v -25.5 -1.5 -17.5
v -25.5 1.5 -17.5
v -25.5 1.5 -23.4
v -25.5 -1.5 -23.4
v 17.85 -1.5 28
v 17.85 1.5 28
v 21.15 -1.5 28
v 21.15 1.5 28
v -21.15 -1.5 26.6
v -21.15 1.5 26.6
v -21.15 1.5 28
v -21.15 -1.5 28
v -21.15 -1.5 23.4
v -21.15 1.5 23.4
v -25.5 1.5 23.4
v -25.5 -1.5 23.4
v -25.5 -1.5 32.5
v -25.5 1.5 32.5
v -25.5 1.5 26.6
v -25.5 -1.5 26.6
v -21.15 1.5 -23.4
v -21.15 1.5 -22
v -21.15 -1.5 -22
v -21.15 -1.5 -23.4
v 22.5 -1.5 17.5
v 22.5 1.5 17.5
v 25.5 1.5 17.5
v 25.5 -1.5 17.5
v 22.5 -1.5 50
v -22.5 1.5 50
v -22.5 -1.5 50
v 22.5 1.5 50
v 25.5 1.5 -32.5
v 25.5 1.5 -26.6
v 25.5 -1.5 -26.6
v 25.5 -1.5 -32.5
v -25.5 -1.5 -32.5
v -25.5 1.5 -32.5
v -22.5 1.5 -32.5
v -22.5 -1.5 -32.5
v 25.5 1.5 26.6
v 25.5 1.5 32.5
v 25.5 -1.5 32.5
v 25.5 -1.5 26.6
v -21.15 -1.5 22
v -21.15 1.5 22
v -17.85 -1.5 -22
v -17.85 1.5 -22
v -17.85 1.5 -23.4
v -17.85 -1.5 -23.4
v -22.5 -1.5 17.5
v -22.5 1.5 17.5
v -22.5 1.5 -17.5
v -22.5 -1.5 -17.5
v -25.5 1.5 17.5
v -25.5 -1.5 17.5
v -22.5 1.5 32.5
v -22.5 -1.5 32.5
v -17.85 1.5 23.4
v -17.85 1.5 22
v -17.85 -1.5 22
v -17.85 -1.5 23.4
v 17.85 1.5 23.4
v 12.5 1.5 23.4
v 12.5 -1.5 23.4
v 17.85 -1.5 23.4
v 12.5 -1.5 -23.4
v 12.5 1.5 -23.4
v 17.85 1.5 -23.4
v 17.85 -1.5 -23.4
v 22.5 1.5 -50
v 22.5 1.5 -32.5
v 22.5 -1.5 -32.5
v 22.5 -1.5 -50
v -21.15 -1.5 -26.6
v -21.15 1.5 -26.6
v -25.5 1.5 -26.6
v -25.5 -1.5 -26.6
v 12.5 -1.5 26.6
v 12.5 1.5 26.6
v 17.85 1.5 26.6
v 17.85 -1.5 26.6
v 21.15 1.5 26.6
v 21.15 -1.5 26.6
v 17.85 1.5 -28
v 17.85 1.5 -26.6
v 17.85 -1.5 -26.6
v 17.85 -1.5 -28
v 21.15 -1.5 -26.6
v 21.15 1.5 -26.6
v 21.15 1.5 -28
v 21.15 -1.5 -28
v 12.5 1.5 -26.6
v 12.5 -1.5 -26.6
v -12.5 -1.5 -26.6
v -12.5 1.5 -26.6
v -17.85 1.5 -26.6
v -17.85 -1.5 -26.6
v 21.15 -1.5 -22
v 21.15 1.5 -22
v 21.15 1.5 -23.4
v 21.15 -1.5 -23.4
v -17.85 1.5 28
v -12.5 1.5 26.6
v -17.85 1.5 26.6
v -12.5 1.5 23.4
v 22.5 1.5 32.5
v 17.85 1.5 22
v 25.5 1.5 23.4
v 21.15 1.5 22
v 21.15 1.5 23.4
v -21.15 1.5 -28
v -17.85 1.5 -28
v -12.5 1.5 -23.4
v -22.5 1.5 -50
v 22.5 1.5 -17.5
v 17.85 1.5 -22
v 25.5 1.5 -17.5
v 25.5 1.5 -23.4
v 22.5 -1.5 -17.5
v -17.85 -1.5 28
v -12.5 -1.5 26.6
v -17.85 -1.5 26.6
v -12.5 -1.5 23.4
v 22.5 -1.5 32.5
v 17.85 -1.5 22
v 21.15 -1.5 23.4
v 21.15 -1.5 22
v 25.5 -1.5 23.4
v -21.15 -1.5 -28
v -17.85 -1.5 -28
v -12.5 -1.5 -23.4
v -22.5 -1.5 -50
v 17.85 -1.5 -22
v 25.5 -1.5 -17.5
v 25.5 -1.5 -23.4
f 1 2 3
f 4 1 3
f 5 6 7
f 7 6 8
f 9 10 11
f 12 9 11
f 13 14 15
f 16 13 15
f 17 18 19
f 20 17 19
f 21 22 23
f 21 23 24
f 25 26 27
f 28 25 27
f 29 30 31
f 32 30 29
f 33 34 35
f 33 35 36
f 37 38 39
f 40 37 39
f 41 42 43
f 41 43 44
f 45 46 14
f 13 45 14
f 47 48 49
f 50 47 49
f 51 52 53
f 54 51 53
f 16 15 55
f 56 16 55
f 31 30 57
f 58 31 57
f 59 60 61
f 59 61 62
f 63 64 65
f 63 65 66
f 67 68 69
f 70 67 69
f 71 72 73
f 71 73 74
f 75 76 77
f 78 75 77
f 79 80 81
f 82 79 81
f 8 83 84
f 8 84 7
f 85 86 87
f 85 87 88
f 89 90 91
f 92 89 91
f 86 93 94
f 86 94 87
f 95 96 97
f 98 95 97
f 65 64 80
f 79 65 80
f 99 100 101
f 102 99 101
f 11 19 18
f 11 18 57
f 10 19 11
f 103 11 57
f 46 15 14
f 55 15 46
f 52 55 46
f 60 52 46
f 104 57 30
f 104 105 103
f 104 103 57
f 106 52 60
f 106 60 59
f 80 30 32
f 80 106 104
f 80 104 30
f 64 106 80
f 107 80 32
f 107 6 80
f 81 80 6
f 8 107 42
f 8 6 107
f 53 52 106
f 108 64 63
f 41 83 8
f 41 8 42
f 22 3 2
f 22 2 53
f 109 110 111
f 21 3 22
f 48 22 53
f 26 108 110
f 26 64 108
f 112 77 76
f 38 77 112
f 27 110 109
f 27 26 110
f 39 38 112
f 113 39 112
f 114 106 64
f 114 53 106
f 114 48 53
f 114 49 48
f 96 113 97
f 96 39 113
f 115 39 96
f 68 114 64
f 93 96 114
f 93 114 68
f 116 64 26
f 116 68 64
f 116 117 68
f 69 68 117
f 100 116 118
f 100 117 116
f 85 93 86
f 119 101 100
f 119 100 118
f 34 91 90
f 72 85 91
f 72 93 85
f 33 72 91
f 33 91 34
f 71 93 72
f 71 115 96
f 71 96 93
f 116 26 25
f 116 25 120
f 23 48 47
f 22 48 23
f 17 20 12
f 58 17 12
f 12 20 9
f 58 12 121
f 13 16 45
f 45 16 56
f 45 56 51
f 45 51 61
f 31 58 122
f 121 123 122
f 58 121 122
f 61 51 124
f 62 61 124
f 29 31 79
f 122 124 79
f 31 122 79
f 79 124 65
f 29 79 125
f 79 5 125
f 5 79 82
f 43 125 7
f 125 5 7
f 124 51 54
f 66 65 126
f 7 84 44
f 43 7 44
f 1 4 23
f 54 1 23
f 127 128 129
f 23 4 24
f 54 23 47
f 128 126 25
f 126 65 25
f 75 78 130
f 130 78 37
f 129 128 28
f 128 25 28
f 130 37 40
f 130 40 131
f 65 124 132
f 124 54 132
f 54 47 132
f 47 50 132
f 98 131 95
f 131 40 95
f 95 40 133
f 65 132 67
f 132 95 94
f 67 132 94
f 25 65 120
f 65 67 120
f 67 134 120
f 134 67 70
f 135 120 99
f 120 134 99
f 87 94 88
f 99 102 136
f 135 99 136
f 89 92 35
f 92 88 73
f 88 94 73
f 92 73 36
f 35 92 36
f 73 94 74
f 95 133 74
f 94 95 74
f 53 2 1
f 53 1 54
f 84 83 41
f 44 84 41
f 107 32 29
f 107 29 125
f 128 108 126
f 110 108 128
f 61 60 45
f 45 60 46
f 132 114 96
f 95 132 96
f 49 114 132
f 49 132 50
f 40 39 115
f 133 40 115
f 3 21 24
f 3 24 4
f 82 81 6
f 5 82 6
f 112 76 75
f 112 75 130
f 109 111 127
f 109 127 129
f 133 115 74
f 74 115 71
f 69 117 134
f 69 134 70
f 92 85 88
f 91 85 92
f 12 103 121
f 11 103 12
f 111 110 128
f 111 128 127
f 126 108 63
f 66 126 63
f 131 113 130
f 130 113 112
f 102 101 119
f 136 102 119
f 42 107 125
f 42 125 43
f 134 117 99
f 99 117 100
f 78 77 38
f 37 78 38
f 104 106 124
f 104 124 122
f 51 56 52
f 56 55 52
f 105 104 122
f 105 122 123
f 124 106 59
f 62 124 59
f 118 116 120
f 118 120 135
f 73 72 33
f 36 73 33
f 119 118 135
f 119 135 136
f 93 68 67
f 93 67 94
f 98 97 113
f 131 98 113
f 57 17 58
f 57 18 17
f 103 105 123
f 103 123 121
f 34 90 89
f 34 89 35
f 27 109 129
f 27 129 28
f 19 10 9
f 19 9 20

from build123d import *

# Parameters (mm, degrees)
SKETCH_1_W                 = 45
SKETCH_1_H                 = 100
SKETCH_1_W_2               = 3
SKETCH_1_H_2               = 15
EXTRUDE_1_DEPTH            = 1.5
SKETCH_2_W                 = 5.35
SKETCH_2_H                 = 3.2
SKETCH_2_W_2               = 3.3
SKETCH_2_H_2               = 1.4
SKETCH_2_W_3               = 4.35
CUT_EXTRUDE_1_DEPTH        = 57.207205944
MIRROR_2_COPY_1_SKETCH_W   = 5.35
MIRROR_2_COPY_1_SKETCH_H   = 3.2
MIRROR_2_COPY_1_SKETCH_W_2 = 3.3
MIRROR_2_COPY_1_SKETCH_H_2 = 1.4
MIRROR_2_COPY_1_SKETCH_W_3 = 4.35
MIRROR_2_COPY_1_DEPTH      = 57.207205944


with BuildPart() as part:
    # 草图1 → 凸台-拉伸1 (new, symmetric)
    with BuildSketch(Plane(origin=(0, 0, 0), x_dir=(1, 0, 0), z_dir=(0, 1, 0))):
        Rectangle(SKETCH_1_W, SKETCH_1_H)
        with Locations((-24, 25)):
            Rectangle(SKETCH_1_W_2, SKETCH_1_H_2)
        with Locations((-24, -25)):
            Rectangle(SKETCH_1_W_2, SKETCH_1_H_2)
        with Locations((24, -25)):
            Rectangle(SKETCH_1_W_2, SKETCH_1_H_2)
        with Locations((24, 25)):
            Rectangle(SKETCH_1_W_2, SKETCH_1_H_2)
    extrude(amount=EXTRUDE_1_DEPTH, both=True)

    # 草图2 → 切除-拉伸1 (cut, symmetric)
    with BuildSketch(Plane(origin=(0, 1.5, 0), x_dir=(1, 0, 0), z_dir=(0, 1, 0))):
        with Locations((15.175, 25)):
            Rectangle(SKETCH_2_W, SKETCH_2_H)
        with Locations((19.5, 27.3)):
            Rectangle(SKETCH_2_W_2, SKETCH_2_H_2)
        with Locations((19.5, 25)):
            Rectangle(SKETCH_2_W_2, SKETCH_2_H)
        with Locations((19.5, 22.7)):
            Rectangle(SKETCH_2_W_2, SKETCH_2_H_2)
        with Locations((23.325, 25)):
            Rectangle(SKETCH_2_W_3, SKETCH_2_H)
    cut_extrude_1 = extrude(amount=CUT_EXTRUDE_1_DEPTH, both=True, mode=Mode.SUBTRACT)

    # 镜向1: 切除-拉伸1 across plane
    add(cut_extrude_1.mirror(Plane(origin=(0, 0, 0), x_dir=(0, 0, 1), z_dir=(1, 0, 0))), mode=Mode.SUBTRACT)

    # 镜向2: 切除-拉伸1 across plane
    add(cut_extrude_1.mirror(Plane.XY), mode=Mode.SUBTRACT)

    # 镜向2 copy 1 sketch → 镜向2 copy 1 (cut, symmetric)
    with BuildSketch(Plane(origin=(0, 1.5, 0), x_dir=(-1, 0, 0), z_dir=(0, 1, 0))):
        with Locations((15.175, 25)):
            Rectangle(MIRROR_2_COPY_1_SKETCH_W, MIRROR_2_COPY_1_SKETCH_H)
        with Locations((19.5, 27.3)):
            Rectangle(MIRROR_2_COPY_1_SKETCH_W_2, MIRROR_2_COPY_1_SKETCH_H_2)
        with Locations((19.5, 25)):
            Rectangle(MIRROR_2_COPY_1_SKETCH_W_2, MIRROR_2_COPY_1_SKETCH_H)
        with Locations((19.5, 22.7)):
            Rectangle(MIRROR_2_COPY_1_SKETCH_W_2, MIRROR_2_COPY_1_SKETCH_H_2)
        with Locations((23.325, 25)):
            Rectangle(MIRROR_2_COPY_1_SKETCH_W_3, MIRROR_2_COPY_1_SKETCH_H)
    extrude(amount=MIRROR_2_COPY_1_DEPTH, both=True, mode=Mode.SUBTRACT)


solid = part.part
